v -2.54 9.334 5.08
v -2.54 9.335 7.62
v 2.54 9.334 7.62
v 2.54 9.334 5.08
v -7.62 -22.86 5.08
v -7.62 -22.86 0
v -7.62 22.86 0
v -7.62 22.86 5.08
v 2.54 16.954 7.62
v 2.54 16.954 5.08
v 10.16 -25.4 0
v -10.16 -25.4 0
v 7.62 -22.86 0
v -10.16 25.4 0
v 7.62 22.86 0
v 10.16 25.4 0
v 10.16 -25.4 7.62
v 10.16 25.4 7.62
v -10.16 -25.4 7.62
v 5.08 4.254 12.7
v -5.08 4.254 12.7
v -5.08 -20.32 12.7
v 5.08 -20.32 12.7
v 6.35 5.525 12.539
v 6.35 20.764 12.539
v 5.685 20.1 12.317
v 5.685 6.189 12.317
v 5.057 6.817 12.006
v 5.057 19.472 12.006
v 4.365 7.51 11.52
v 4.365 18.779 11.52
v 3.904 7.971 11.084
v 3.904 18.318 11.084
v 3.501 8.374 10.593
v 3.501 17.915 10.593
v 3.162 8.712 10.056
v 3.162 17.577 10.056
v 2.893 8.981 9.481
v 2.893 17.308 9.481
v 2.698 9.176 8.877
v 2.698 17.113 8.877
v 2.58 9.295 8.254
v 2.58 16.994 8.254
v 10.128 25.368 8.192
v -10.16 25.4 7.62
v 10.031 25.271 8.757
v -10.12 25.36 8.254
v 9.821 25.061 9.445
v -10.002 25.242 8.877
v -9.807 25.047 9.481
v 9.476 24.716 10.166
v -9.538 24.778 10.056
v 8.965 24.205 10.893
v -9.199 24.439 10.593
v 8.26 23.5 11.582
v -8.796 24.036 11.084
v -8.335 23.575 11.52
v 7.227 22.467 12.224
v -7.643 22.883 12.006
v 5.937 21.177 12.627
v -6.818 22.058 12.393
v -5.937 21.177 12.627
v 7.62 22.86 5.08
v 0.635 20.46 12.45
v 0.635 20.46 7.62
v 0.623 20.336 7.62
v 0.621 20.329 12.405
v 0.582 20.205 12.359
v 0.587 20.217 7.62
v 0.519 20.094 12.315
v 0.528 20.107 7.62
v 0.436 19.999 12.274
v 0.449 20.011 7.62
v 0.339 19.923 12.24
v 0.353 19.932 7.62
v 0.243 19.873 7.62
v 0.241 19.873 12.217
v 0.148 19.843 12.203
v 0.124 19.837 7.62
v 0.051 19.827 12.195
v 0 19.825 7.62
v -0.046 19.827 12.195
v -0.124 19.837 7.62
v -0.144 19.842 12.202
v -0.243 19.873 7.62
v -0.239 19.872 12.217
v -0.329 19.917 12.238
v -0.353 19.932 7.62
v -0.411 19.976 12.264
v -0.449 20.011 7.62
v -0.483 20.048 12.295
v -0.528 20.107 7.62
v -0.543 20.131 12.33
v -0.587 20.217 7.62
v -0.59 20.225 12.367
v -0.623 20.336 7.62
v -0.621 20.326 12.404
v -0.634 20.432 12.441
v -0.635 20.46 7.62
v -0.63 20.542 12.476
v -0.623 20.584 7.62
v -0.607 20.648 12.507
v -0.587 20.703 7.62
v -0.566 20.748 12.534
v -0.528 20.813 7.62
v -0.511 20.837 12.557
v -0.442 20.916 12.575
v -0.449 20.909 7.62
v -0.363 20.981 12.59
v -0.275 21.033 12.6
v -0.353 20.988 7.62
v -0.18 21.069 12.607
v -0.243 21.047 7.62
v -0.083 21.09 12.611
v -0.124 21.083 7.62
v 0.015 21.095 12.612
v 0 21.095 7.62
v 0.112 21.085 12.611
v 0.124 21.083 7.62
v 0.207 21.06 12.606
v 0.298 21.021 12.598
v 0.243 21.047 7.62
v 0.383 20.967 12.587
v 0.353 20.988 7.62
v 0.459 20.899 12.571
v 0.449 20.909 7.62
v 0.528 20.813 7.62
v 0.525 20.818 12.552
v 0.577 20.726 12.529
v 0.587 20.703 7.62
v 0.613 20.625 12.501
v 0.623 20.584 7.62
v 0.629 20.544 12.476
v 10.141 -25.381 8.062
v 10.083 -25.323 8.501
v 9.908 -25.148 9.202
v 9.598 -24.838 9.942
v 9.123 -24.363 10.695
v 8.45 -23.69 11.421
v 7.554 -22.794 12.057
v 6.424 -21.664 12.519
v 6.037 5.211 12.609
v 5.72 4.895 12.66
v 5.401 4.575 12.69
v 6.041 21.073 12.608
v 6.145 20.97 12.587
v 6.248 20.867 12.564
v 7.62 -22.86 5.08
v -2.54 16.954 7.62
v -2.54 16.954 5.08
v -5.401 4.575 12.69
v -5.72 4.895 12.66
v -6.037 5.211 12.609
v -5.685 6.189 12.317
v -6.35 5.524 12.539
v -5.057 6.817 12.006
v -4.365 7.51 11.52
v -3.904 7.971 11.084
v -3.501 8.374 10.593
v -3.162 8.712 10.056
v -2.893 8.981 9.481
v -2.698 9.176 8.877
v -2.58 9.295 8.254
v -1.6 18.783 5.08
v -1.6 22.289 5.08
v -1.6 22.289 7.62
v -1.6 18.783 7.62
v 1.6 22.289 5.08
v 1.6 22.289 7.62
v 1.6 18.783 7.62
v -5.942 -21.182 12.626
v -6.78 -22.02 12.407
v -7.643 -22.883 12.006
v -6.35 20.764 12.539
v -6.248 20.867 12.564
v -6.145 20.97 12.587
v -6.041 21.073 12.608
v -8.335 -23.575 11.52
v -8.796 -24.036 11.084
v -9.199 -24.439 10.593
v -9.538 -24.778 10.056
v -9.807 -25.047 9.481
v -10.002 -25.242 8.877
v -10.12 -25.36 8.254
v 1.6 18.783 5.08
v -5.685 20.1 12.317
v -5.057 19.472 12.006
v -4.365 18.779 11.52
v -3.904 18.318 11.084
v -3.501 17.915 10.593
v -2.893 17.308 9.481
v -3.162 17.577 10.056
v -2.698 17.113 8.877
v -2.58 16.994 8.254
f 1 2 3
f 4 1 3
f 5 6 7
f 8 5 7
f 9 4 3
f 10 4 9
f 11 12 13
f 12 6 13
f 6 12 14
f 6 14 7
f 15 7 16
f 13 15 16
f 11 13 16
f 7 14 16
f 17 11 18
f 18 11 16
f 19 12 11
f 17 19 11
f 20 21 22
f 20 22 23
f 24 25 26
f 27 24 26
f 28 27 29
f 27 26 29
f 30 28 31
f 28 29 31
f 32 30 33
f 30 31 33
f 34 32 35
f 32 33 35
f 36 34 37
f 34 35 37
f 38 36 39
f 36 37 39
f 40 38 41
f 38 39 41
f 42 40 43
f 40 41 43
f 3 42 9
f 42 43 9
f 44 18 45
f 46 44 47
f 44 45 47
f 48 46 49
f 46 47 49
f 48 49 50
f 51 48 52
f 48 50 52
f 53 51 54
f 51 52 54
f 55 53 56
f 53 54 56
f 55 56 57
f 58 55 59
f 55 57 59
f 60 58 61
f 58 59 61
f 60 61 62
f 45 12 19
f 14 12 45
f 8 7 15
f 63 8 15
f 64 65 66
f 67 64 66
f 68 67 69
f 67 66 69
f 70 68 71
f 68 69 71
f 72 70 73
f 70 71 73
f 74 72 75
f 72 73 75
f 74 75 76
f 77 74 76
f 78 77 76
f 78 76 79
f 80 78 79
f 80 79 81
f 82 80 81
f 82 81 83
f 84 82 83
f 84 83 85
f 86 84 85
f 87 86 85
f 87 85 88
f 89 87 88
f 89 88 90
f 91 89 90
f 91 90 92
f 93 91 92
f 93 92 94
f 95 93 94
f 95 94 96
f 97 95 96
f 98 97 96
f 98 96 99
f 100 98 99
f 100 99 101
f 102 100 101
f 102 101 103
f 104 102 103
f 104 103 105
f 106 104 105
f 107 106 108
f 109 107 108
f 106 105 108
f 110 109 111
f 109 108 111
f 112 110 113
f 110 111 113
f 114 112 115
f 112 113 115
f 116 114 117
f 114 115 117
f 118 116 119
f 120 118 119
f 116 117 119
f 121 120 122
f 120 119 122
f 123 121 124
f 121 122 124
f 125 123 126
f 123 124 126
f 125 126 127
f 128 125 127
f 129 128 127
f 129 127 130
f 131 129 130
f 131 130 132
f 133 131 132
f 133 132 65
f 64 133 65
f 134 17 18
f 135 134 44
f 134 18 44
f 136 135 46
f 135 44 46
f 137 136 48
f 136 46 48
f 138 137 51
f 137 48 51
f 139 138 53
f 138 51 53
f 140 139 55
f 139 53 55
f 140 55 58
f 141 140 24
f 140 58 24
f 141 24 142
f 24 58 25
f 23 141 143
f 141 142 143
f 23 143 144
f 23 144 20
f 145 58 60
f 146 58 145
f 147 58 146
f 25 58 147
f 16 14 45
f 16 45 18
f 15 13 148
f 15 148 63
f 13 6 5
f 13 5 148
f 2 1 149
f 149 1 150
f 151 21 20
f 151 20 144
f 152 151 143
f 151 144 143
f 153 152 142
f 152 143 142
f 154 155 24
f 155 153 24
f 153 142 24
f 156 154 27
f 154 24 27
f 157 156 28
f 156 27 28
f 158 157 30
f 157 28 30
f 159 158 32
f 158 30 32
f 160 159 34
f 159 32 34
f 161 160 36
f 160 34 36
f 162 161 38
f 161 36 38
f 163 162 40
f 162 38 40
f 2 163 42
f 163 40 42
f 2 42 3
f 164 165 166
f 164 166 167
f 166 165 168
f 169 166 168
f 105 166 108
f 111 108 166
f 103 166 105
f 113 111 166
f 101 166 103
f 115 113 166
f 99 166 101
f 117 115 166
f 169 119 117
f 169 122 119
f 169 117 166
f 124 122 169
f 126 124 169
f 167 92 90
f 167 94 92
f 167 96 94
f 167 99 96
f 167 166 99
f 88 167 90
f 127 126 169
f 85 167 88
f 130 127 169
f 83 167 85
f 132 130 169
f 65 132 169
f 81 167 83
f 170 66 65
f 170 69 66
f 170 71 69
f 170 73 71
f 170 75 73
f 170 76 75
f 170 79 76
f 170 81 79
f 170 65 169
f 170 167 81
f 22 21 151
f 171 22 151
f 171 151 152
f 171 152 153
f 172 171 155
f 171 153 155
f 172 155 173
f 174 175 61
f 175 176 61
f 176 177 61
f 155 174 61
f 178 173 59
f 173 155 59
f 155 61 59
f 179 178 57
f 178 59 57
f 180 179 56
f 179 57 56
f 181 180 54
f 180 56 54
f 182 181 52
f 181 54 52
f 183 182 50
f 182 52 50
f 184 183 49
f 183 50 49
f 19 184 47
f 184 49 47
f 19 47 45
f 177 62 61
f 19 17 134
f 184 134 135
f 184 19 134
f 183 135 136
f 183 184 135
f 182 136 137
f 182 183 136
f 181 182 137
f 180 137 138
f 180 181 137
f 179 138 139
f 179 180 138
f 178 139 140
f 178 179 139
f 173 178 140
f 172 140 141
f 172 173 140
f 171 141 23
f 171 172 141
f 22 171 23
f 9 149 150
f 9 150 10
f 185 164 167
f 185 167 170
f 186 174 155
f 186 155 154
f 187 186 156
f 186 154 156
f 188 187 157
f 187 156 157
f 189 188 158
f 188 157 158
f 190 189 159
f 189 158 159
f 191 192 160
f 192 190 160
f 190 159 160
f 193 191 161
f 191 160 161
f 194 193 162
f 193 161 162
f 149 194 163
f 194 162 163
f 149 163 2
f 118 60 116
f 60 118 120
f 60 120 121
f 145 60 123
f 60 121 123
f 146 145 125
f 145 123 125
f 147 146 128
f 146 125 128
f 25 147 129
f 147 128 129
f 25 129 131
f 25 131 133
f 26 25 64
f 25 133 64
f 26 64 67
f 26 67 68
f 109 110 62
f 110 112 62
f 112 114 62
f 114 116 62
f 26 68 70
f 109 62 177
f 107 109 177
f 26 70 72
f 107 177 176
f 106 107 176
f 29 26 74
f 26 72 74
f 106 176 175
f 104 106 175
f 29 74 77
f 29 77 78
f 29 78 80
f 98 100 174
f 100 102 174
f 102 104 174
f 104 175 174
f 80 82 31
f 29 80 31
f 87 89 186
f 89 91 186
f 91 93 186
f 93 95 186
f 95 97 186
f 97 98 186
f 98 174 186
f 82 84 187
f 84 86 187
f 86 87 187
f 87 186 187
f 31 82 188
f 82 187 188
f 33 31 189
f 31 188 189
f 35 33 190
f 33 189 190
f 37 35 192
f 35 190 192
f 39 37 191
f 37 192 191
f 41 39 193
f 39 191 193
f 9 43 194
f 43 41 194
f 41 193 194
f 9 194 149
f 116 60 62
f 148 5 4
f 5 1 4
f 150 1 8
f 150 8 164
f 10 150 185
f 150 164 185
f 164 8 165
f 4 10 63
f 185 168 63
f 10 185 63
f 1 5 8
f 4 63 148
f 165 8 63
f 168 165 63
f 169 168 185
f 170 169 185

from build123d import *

# Parameters (mm, degrees)
F0_W         = 20.32
F0_H         = 50.8
F1_DEPTH     = 12.7
F2_W         = 15.24
F2_H         = 45.72
F3_DEPTH     = 5.08
F4_W         = 3.2004
F4_H         = 3.5052
F5_DEPTH     = 2.54
F6_W         = 5.08
F6_H         = 7.62
F7_DEPTH     = 25.4
F8_T1_DEPTH  = 76.2
F8_T3_DEPTH  = 45.72
F8_T5_DEPTH  = 7.62
F8_T7_DEPTH  = 5.08
F8_T13_DEPTH = 20.32
F8_T17_DEPTH = 17.78
F8_T24_DEPTH = 20.32
F8_T28_DEPTH = 17.78
F8_T35_DEPTH = 17.78
F8_T39_DEPTH = 20.32
F8_T46_DEPTH = 20.32
F8_T50_DEPTH = 17.78
F9_R         = 0.635
F10_DEPTH    = 25.4


# Not quite as in the source:
# - a fillet or chamfer that OpenCascade refuses, or shapes differently, is made with other operations: its cross-section is extruded or revolved along the edge and cut away or added


with BuildPart() as f1:
    # F0 (on Top) → F1 (new body)
    with BuildSketch(Plane.XY):
        Rectangle(F0_W, F0_H)
    extrude(amount=F1_DEPTH)

    # F2 (on Top) → F3 (cut)
    with BuildSketch(Plane.XY):
        Rectangle(F2_W, F2_H)
    extrude(amount=F3_DEPTH, mode=Mode.SUBTRACT)

    # F4 (on face) → F5 (cut)
    with BuildSketch(Plane(origin=(0, 0, 5.08), x_dir=(1, 0, 0), z_dir=(0, 0, -1))):
        with Locations((0, -20.5359)):
            Rectangle(F4_W, F4_H)
    extrude(amount=-F5_DEPTH, mode=Mode.SUBTRACT)

    # F6 (on Top) → F7 (cut)
    with BuildSketch(Plane.XY):
        with Locations((0, 13.1445)):
            Rectangle(F6_W, F6_H)
    extrude(amount=F7_DEPTH, mode=Mode.SUBTRACT)

    # F8: fillet of radius 5.08 on 8 edges, made by hand

    # F8_s2 → F8_t1 (cut)
    with BuildSketch(Plane.XZ.offset(-38.1)):
        with BuildLine():
            ThreePointArc((10.16, 7.62), (8.6721024484, 11.2121024484), (5.08, 12.7))
            Line((5.08, 12.7), (10.16, 12.7))
            Line((10.16, 12.7), (10.16, 7.62))
        make_face()
        with BuildLine():
            ThreePointArc((-5.08, 12.7), (-8.6721024484, 11.2121024484), (-10.16, 7.62))
            Line((-10.16, 7.62), (-10.16, 12.7))
            Line((-10.16, 12.7), (-5.08, 12.7))
        make_face()
    extrude(amount=F8_T1_DEPTH, mode=Mode.SUBTRACT)

    # F8_s4 → F8_t3 (cut)
    with BuildSketch(Plane.YZ.offset(-22.86)):
        with BuildLine():
            ThreePointArc((-25.4, 7.62), (-23.9121024484, 11.2121024484), (-20.32, 12.7))
            Line((-20.32, 12.7), (-25.4, 12.7))
            Line((-25.4, 12.7), (-25.4, 7.62))
        make_face()
        with BuildLine():
            ThreePointArc((25.4, 7.62), (23.9121024484, 11.2121024484), (20.32, 12.7))
            Line((20.32, 12.7), (25.4, 12.7))
            Line((25.4, 12.7), (25.4, 7.62))
        make_face()
    extrude(amount=F8_T3_DEPTH, mode=Mode.SUBTRACT)

    # F8_s6 → F8_t5 (cut)
    with BuildSketch(Plane.XZ.offset(-16.9545)):
        with BuildLine():
            ThreePointArc((7.62, 12.7), (4.0278975516, 11.2121024484), (2.54, 7.62))
            Line((2.54, 7.62), (2.54, 12.7))
            Line((2.54, 12.7), (7.62, 12.7))
        make_face()
        with BuildLine():
            ThreePointArc((-7.62, 12.7), (-4.0278975516, 11.2121024484), (-2.54, 7.62))
            Line((-2.54, 7.62), (-2.54, 12.7))
            Line((-2.54, 12.7), (-7.62, 12.7))
        make_face()
    extrude(amount=F8_T5_DEPTH, mode=Mode.SUBTRACT)

    # F8_s8 → F8_t7 (cut)
    with BuildSketch(Plane.YZ.offset(-2.54)):
        with BuildLine():
            ThreePointArc((22.0345, 12.7), (18.4423975516, 11.2121024484), (16.9545, 7.62))
            Line((16.9545, 7.62), (16.9545, 12.7))
            Line((16.9545, 12.7), (22.0345, 12.7))
        make_face()
        with BuildLine():
            ThreePointArc((4.2545, 12.7), (7.8466024484, 11.2121024484), (9.3345, 7.62))
            Line((9.3345, 7.62), (9.3345, 12.7))
            Line((9.3345, 12.7), (4.2545, 12.7))
        make_face()
    extrude(amount=F8_T7_DEPTH, mode=Mode.SUBTRACT)


with BuildPart() as f8_tool11:
    # F8_s12 → F8_t13 (new body)
    with BuildSketch(Plane.XZ.offset(-29.6545)):
        with BuildLine():
            ThreePointArc((7.62, 12.7), (4.0278975516, 11.2121024484), (2.54, 7.62))
            Line((2.54, 7.62), (2.54, 12.7))
            Line((2.54, 12.7), (7.62, 12.7))
        make_face()
    extrude(amount=F8_T13_DEPTH)

    split(bisect_by=Plane.XZ.offset(-16.9545), keep=Keep.BOTTOM)


with BuildPart() as f8_tool15:
    # F8_s16 → F8_t17 (new body)
    with BuildSketch(Plane.YZ.offset(-2.54)):
        with BuildLine():
            ThreePointArc((22.0345, 12.7), (18.4423975516, 11.2121024484), (16.9545, 7.62))
            Line((16.9545, 7.62), (16.9545, 12.7))
            Line((16.9545, 12.7), (22.0345, 12.7))
        make_face()
    extrude(amount=F8_T17_DEPTH)

    split(bisect_by=Plane.YZ.offset(2.54), keep=Keep.TOP)


with BuildPart() as f8_tool11_1:
    add(f8_tool11.part)

    # F8_t19: intersect F8_tool15
    add(f8_tool15.part, mode=Mode.INTERSECT)


with BuildPart() as f1_1:
    add(f1.part)

    # F8_t9: cut F8_tool11
    add(f8_tool11_1.part, mode=Mode.SUBTRACT)


with BuildPart() as f8_tool22:
    # F8_s23 → F8_t24 (new body)
    with BuildSketch(Plane.XZ.offset(-16.9545)):
        with BuildLine():
            ThreePointArc((7.62, 12.7), (4.0278975516, 11.2121024484), (2.54, 7.62))
            Line((2.54, 7.62), (2.54, 12.7))
            Line((2.54, 12.7), (7.62, 12.7))
        make_face()
    extrude(amount=F8_T24_DEPTH)

    split(bisect_by=Plane.XZ.offset(-9.3345), keep=Keep.TOP)


with BuildPart() as f8_tool26:
    # F8_s27 → F8_t28 (new body)
    with BuildSketch(Plane.YZ.offset(15.24)):
        with BuildLine():
            ThreePointArc((4.2545, 12.7), (7.8466024484, 11.2121024484), (9.3345, 7.62))
            Line((9.3345, 7.62), (9.3345, 12.7))
            Line((9.3345, 12.7), (4.2545, 12.7))
        make_face()
    extrude(amount=-F8_T28_DEPTH)

    split(bisect_by=Plane.YZ.offset(2.54), keep=Keep.TOP)


with BuildPart() as f8_tool22_1:
    add(f8_tool22.part)

    # F8_t30: intersect F8_tool26
    add(f8_tool26.part, mode=Mode.INTERSECT)


with BuildPart() as f1_2:
    add(f1_1.part)

    # F8_t20: cut F8_tool22
    add(f8_tool22_1.part, mode=Mode.SUBTRACT)


with BuildPart() as f8_tool33:
    # F8_s34 → F8_t35 (new body)
    with BuildSketch(Plane.YZ.offset(-15.24)):
        with BuildLine():
            ThreePointArc((22.0345, 12.7), (18.4423975516, 11.2121024484), (16.9545, 7.62))
            Line((16.9545, 7.62), (16.9545, 12.7))
            Line((16.9545, 12.7), (22.0345, 12.7))
        make_face()
    extrude(amount=F8_T35_DEPTH)

    split(bisect_by=Plane.YZ.offset(-2.54), keep=Keep.BOTTOM)


with BuildPart() as f8_tool37:
    # F8_s38 → F8_t39 (new body)
    with BuildSketch(Plane.XZ.offset(-9.3345)):
        with BuildLine():
            ThreePointArc((-7.62, 12.7), (-4.0278975516, 11.2121024484), (-2.54, 7.62))
            Line((-2.54, 7.62), (-2.54, 12.7))
            Line((-2.54, 12.7), (-7.62, 12.7))
        make_face()
    extrude(amount=-F8_T39_DEPTH)

    split(bisect_by=Plane.XZ.offset(-16.9545), keep=Keep.BOTTOM)


with BuildPart() as f8_tool33_1:
    add(f8_tool33.part)

    # F8_t41: intersect F8_tool37
    add(f8_tool37.part, mode=Mode.INTERSECT)


with BuildPart() as f1_3:
    add(f1_2.part)

    # F8_t31: cut F8_tool33
    add(f8_tool33_1.part, mode=Mode.SUBTRACT)


with BuildPart() as f8_tool44:
    # F8_s45 → F8_t46 (new body)
    with BuildSketch(Plane.XZ.offset(3.3655)):
        with BuildLine():
            ThreePointArc((-7.62, 12.7), (-4.0278975516, 11.2121024484), (-2.54, 7.62))
            Line((-2.54, 7.62), (-2.54, 12.7))
            Line((-2.54, 12.7), (-7.62, 12.7))
        make_face()
    extrude(amount=-F8_T46_DEPTH)

    split(bisect_by=Plane.XZ.offset(-9.3345), keep=Keep.TOP)


with BuildPart() as f8_tool48:
    # F8_s49 → F8_t50 (new body)
    with BuildSketch(Plane.YZ.offset(2.54)):
        with BuildLine():
            ThreePointArc((4.2545, 12.7), (7.8466024484, 11.2121024484), (9.3345, 7.62))
            Line((9.3345, 7.62), (9.3345, 12.7))
            Line((9.3345, 12.7), (4.2545, 12.7))
        make_face()
    extrude(amount=-F8_T50_DEPTH)

    split(bisect_by=Plane.YZ.offset(-2.54), keep=Keep.BOTTOM)


with BuildPart() as f8_tool44_1:
    add(f8_tool44.part)

    # F8_t52: intersect F8_tool48
    add(f8_tool48.part, mode=Mode.INTERSECT)


with BuildPart() as f1_4:
    add(f1_3.part)

    # F8_t42: cut F8_tool44
    add(f8_tool44_1.part, mode=Mode.SUBTRACT)

    # F9 (on face) → F10 (cut)
    with BuildSketch(Plane(origin=(0, 0, 7.62), x_dir=(1, 0, 0), z_dir=(0, 0, -1))):
        with Locations((0, -20.460145548)):
            Circle(F9_R)
    extrude(amount=-F10_DEPTH, mode=Mode.SUBTRACT)


solid = f1_4.part
